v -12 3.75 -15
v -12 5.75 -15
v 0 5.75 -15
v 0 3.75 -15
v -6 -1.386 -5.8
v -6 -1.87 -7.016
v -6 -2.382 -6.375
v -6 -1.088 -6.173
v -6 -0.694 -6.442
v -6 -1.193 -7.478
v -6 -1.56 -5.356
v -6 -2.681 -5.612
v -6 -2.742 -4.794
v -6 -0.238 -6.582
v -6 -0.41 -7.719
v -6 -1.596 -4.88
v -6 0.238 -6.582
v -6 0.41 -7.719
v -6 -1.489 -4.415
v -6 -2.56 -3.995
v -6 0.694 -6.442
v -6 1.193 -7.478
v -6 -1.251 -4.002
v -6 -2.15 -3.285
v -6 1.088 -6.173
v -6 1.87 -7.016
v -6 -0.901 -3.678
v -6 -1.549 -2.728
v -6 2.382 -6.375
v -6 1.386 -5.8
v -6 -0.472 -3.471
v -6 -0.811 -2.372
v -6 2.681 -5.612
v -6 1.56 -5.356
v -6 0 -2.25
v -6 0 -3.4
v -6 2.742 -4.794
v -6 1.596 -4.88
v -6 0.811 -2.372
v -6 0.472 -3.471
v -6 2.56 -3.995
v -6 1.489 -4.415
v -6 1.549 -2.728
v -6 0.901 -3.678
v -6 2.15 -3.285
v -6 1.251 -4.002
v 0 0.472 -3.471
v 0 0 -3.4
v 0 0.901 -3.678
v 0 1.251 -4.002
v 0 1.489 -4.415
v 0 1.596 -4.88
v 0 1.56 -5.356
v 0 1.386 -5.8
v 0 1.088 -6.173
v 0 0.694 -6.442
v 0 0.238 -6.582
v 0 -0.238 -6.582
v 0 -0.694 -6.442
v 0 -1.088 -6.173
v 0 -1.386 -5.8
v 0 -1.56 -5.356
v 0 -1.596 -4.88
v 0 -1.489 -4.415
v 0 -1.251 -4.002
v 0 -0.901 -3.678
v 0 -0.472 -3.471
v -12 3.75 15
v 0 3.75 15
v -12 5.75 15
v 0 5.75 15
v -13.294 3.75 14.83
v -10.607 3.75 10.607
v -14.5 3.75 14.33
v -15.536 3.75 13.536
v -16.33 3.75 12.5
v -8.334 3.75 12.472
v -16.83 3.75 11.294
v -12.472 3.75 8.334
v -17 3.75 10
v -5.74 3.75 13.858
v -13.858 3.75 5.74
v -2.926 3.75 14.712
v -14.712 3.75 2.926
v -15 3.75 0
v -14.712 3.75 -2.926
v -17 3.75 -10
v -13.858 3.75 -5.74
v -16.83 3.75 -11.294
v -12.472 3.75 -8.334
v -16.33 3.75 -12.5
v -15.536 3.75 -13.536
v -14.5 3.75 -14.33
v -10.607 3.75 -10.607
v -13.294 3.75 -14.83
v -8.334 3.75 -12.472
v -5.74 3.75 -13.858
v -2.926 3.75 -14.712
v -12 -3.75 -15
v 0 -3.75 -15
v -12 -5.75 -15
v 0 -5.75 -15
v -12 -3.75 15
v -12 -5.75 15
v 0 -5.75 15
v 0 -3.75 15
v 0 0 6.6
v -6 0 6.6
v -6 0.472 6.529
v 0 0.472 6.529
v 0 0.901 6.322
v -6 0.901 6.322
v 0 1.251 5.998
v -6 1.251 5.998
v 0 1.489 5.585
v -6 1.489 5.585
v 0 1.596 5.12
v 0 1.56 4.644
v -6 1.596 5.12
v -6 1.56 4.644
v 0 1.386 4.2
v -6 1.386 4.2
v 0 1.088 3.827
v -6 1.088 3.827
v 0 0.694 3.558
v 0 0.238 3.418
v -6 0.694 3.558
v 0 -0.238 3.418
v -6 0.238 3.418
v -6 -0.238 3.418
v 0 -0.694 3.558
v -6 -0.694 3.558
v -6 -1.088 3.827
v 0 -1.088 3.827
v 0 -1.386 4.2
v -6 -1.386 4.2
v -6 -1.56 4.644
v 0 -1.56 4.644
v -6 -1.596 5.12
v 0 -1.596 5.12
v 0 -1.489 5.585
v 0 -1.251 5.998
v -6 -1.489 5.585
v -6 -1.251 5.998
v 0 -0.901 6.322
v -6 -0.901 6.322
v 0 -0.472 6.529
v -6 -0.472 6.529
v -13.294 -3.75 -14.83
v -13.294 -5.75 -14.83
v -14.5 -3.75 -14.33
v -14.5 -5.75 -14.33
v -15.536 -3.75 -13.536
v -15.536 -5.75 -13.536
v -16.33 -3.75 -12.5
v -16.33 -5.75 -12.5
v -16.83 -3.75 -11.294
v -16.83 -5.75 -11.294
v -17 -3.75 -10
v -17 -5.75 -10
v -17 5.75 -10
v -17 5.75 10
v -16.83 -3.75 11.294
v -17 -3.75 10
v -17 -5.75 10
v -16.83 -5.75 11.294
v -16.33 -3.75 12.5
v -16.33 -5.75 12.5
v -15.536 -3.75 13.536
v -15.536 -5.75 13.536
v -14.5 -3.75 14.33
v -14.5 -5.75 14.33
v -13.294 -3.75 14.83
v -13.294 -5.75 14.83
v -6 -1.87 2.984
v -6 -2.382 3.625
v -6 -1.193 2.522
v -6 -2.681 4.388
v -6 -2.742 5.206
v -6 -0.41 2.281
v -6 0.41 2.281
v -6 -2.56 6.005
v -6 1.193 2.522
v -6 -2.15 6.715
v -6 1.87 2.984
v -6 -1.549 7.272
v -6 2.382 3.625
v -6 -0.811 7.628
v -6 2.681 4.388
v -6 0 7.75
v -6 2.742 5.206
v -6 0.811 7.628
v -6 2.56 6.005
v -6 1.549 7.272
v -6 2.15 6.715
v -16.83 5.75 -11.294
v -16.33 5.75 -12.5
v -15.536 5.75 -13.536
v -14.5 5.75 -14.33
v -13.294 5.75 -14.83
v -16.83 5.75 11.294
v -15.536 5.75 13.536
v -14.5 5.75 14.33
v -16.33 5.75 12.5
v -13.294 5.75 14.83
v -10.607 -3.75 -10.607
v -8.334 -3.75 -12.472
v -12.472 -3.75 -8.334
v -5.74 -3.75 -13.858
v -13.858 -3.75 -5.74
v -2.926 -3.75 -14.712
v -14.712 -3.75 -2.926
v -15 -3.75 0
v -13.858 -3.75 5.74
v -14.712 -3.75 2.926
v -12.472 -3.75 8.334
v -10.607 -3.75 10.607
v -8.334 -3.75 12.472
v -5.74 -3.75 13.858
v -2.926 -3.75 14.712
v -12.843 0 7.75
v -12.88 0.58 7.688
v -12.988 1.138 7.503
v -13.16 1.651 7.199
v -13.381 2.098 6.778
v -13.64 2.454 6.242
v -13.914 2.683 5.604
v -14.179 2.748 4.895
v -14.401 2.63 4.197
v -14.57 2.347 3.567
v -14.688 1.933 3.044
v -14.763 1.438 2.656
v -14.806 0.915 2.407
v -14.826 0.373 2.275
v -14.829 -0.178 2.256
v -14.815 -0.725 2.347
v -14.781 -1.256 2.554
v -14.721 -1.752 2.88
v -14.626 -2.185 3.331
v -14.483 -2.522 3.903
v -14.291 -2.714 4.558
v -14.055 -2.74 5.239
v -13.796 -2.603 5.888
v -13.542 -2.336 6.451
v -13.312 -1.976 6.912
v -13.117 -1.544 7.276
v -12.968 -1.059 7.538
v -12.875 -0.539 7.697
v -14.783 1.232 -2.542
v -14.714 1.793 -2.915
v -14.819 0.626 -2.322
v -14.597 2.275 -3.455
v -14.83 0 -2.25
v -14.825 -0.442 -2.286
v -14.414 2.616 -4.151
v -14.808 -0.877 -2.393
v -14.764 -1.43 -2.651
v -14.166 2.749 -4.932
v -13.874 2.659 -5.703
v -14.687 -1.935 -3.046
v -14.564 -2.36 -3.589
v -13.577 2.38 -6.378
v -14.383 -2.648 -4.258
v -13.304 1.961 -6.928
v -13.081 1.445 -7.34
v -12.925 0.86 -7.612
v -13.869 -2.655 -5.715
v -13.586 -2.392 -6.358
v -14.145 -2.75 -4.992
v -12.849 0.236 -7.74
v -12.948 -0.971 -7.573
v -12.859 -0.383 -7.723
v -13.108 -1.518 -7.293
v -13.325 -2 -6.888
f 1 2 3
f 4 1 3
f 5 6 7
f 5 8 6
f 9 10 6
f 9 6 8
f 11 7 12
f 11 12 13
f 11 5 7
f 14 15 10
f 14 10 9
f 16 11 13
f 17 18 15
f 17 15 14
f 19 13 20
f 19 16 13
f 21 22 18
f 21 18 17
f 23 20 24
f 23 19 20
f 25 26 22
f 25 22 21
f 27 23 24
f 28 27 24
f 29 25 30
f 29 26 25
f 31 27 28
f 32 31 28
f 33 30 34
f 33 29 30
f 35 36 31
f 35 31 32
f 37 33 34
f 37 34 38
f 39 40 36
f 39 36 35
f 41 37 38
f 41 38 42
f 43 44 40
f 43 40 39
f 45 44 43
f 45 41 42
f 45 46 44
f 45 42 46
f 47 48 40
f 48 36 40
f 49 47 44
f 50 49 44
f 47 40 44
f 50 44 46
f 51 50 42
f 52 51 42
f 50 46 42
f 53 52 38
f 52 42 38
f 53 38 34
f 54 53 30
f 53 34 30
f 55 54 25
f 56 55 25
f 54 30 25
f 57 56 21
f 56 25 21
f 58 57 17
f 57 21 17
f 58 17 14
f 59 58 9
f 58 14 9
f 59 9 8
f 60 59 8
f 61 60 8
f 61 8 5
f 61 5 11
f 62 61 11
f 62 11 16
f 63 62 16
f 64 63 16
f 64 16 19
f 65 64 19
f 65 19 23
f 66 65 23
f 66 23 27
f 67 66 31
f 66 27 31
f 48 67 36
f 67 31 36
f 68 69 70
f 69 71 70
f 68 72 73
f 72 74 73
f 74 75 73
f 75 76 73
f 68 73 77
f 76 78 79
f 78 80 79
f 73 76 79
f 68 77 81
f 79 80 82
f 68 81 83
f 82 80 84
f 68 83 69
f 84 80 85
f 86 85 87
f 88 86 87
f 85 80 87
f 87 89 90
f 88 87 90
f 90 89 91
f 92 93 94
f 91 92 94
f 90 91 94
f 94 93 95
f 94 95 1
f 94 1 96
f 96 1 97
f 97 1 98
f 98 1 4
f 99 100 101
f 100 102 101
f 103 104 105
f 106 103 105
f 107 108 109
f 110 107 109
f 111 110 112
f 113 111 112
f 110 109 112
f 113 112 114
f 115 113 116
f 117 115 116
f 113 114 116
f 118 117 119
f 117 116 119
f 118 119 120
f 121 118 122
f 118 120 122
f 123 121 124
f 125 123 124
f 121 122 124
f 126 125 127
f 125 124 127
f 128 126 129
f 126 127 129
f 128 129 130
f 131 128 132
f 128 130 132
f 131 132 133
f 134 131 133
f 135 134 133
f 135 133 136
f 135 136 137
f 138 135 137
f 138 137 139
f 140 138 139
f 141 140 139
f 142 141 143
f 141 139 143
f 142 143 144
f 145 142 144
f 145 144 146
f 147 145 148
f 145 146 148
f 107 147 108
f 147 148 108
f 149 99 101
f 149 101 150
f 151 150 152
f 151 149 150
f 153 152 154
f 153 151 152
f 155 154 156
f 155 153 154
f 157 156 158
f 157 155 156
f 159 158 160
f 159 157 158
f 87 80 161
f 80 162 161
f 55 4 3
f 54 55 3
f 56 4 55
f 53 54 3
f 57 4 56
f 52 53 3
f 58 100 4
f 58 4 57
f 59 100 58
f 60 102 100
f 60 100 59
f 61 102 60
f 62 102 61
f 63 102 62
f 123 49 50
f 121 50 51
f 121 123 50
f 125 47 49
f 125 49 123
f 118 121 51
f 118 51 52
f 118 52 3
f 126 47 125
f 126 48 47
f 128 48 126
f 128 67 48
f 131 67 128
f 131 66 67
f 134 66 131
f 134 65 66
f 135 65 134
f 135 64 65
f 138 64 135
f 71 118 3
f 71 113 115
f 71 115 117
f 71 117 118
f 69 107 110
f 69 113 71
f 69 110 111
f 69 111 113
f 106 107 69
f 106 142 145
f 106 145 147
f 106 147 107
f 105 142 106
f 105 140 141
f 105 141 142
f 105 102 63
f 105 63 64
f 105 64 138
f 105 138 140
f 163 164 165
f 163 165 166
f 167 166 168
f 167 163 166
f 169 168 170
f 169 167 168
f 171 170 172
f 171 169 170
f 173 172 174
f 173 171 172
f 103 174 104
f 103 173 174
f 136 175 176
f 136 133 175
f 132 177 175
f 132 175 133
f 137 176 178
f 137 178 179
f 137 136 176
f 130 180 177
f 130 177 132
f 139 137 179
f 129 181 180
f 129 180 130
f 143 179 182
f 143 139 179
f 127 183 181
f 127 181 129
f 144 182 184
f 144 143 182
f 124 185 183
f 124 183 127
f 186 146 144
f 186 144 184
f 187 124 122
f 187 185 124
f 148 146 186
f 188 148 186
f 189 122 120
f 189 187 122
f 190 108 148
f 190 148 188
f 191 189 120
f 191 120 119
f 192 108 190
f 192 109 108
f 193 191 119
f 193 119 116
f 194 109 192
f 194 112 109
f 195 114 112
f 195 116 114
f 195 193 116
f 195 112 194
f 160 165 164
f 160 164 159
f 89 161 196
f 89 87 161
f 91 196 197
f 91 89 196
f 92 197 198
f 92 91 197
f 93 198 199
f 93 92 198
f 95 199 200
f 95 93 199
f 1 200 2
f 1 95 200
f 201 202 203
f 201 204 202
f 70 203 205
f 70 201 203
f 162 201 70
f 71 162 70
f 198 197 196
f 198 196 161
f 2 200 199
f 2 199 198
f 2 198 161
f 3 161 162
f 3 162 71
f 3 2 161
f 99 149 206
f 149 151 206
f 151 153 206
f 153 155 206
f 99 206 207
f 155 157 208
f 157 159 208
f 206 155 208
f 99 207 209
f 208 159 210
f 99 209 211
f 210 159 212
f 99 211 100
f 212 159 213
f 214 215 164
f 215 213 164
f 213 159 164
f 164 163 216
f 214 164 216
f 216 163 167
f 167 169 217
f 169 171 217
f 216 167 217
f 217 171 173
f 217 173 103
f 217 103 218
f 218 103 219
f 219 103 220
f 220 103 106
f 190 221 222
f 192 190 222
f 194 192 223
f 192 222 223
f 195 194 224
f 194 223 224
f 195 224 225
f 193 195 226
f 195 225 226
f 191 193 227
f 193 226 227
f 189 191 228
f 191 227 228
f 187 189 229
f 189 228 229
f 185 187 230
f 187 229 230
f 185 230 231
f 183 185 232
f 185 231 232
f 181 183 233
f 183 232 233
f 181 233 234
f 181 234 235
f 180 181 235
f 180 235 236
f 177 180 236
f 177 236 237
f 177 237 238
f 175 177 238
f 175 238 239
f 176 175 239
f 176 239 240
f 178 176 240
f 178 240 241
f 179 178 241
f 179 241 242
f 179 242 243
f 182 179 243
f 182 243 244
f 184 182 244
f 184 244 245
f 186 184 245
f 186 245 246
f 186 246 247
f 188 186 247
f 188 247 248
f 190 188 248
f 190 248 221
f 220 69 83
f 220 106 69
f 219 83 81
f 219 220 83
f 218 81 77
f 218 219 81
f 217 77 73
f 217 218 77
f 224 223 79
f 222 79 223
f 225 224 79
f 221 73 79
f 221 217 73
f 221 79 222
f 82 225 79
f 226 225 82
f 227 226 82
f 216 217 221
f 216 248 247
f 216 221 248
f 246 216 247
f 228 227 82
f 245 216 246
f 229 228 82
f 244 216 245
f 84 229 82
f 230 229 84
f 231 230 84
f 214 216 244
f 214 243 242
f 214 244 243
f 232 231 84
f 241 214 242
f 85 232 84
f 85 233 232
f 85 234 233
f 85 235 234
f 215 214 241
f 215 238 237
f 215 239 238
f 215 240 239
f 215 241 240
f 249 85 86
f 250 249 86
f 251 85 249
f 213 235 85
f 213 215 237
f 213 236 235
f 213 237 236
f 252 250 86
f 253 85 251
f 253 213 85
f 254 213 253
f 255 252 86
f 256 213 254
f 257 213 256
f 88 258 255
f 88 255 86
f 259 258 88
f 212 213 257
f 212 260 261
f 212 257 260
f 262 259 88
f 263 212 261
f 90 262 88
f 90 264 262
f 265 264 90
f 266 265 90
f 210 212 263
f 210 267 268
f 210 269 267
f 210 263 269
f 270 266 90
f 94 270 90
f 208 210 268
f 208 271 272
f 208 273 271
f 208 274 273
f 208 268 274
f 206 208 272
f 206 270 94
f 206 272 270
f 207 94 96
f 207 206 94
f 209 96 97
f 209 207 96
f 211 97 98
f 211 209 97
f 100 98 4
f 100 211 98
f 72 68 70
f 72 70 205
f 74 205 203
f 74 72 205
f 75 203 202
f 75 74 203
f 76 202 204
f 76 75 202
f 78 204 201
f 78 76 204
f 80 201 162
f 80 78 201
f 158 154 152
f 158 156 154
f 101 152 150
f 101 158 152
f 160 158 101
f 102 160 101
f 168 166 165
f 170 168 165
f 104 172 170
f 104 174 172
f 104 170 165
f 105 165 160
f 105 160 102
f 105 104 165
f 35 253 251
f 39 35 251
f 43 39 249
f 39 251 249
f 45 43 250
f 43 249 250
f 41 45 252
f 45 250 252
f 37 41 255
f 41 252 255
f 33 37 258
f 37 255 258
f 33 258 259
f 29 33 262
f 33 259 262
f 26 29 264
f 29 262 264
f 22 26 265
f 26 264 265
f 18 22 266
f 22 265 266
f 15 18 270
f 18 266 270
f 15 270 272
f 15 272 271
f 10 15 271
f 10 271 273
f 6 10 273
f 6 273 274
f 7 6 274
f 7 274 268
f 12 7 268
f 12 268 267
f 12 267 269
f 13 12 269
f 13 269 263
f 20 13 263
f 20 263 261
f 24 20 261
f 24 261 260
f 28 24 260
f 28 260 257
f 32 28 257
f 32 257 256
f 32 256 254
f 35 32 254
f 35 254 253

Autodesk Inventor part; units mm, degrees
ref_plane "YZ Plane" through (0, 0, 0) normal (1, 0, 0) x (0, 1, 0)
ref_plane "XZ Plane" through (0, 0, 0) normal (0, 1, 0) x (-1, 0, 0)
sketch "Sketch1" plane through (0, 0, 0) normal (0, 1, 0) x (-1, 0, 0)
  circle A0 centre (0, 0) radius 15
  line L0 (0, -15) -> (0, 15)
  dimension "d0" = 30
extrude "Extrusion2" add sketch "Sketch1" along normal mid plane 11.5 contours A0 L0 picked at (3.1174, 3.9092)
sketch "Sketch2" plane through (0, 5.75, 0) normal (0, 1, 0) x (1, 0, 0)
  line L0 (0, -15) -> (0, 15) projected
  line L1 (0, -15) -> (-17, -15)
  line L2 (-17, -15) -> (-17, 15)
  line L3 (-17, 15) -> (0, 15)
  line L4 (0, 15) -> (0, -15)
  point P0 (0, 0)
extrude "Extrusion3" add sketch "Sketch2" against normal blind 2
sketch "Sketch3" plane through (0, -5.75, 0) normal (0, -1, 0) x (1, 0, 0)
  arc A0 (0, 15) -> (0, -15) centre (0, 0) ccw projected
  line L0 (-17, 15) -> (-17, -15) projected
  line L1 (0, -15) -> (-17, -15)
  line L2 (-17, -15) -> (-17, 15)
  line L3 (-17, 15) -> (0, 15)
  line L4 (0, 15) -> (0, -15)
extrude "Extrusion4" add sketch "Sketch3" against normal blind 2 contours A0 L1 L0 L3
ref_plane "Work Plane1" through (-15, 0, 0) normal (-1, 0, 0) x (0, 0, 1)
sketch "Sketch5" plane through (-15, 0, 0) normal (-1, 0, 0) x (0, 0, 1)
  circle A0 centre (-5, 0) radius 1.6
  line L0 (-15, 3.75) -> (-15, -3.75) projected
  circle A1 centre (5, 0) radius 1.6
  line L1 (15, -3.75) -> (15, 3.75) projected
  circle A2 centre (-5, 0) radius 2.75
  circle A3 centre (5, 0) radius 2.75
  point P0 (0, 0)
  dimension "d10" = 3.2
  dimension "d11" = 10
  dimension "d12" = 3.2
  dimension "d13" = 10
  dimension "d14" = 5.5
  dimension "d15" = 5.5
extrude "Extrusion5" cut sketch "Sketch5" against normal blind 15 contours A0 | A1
extrude "Extrusion6" cut sketch "Sketch5" against normal blind 9
fillet "Fillet1" radius 5 4 edges at (-17, 4.75, -15) (-17, 4.75, 15) (-17, -4.75, 15) (-17, -4.75, -15)
properties part number "Katrol Lifter_3DPrint"
